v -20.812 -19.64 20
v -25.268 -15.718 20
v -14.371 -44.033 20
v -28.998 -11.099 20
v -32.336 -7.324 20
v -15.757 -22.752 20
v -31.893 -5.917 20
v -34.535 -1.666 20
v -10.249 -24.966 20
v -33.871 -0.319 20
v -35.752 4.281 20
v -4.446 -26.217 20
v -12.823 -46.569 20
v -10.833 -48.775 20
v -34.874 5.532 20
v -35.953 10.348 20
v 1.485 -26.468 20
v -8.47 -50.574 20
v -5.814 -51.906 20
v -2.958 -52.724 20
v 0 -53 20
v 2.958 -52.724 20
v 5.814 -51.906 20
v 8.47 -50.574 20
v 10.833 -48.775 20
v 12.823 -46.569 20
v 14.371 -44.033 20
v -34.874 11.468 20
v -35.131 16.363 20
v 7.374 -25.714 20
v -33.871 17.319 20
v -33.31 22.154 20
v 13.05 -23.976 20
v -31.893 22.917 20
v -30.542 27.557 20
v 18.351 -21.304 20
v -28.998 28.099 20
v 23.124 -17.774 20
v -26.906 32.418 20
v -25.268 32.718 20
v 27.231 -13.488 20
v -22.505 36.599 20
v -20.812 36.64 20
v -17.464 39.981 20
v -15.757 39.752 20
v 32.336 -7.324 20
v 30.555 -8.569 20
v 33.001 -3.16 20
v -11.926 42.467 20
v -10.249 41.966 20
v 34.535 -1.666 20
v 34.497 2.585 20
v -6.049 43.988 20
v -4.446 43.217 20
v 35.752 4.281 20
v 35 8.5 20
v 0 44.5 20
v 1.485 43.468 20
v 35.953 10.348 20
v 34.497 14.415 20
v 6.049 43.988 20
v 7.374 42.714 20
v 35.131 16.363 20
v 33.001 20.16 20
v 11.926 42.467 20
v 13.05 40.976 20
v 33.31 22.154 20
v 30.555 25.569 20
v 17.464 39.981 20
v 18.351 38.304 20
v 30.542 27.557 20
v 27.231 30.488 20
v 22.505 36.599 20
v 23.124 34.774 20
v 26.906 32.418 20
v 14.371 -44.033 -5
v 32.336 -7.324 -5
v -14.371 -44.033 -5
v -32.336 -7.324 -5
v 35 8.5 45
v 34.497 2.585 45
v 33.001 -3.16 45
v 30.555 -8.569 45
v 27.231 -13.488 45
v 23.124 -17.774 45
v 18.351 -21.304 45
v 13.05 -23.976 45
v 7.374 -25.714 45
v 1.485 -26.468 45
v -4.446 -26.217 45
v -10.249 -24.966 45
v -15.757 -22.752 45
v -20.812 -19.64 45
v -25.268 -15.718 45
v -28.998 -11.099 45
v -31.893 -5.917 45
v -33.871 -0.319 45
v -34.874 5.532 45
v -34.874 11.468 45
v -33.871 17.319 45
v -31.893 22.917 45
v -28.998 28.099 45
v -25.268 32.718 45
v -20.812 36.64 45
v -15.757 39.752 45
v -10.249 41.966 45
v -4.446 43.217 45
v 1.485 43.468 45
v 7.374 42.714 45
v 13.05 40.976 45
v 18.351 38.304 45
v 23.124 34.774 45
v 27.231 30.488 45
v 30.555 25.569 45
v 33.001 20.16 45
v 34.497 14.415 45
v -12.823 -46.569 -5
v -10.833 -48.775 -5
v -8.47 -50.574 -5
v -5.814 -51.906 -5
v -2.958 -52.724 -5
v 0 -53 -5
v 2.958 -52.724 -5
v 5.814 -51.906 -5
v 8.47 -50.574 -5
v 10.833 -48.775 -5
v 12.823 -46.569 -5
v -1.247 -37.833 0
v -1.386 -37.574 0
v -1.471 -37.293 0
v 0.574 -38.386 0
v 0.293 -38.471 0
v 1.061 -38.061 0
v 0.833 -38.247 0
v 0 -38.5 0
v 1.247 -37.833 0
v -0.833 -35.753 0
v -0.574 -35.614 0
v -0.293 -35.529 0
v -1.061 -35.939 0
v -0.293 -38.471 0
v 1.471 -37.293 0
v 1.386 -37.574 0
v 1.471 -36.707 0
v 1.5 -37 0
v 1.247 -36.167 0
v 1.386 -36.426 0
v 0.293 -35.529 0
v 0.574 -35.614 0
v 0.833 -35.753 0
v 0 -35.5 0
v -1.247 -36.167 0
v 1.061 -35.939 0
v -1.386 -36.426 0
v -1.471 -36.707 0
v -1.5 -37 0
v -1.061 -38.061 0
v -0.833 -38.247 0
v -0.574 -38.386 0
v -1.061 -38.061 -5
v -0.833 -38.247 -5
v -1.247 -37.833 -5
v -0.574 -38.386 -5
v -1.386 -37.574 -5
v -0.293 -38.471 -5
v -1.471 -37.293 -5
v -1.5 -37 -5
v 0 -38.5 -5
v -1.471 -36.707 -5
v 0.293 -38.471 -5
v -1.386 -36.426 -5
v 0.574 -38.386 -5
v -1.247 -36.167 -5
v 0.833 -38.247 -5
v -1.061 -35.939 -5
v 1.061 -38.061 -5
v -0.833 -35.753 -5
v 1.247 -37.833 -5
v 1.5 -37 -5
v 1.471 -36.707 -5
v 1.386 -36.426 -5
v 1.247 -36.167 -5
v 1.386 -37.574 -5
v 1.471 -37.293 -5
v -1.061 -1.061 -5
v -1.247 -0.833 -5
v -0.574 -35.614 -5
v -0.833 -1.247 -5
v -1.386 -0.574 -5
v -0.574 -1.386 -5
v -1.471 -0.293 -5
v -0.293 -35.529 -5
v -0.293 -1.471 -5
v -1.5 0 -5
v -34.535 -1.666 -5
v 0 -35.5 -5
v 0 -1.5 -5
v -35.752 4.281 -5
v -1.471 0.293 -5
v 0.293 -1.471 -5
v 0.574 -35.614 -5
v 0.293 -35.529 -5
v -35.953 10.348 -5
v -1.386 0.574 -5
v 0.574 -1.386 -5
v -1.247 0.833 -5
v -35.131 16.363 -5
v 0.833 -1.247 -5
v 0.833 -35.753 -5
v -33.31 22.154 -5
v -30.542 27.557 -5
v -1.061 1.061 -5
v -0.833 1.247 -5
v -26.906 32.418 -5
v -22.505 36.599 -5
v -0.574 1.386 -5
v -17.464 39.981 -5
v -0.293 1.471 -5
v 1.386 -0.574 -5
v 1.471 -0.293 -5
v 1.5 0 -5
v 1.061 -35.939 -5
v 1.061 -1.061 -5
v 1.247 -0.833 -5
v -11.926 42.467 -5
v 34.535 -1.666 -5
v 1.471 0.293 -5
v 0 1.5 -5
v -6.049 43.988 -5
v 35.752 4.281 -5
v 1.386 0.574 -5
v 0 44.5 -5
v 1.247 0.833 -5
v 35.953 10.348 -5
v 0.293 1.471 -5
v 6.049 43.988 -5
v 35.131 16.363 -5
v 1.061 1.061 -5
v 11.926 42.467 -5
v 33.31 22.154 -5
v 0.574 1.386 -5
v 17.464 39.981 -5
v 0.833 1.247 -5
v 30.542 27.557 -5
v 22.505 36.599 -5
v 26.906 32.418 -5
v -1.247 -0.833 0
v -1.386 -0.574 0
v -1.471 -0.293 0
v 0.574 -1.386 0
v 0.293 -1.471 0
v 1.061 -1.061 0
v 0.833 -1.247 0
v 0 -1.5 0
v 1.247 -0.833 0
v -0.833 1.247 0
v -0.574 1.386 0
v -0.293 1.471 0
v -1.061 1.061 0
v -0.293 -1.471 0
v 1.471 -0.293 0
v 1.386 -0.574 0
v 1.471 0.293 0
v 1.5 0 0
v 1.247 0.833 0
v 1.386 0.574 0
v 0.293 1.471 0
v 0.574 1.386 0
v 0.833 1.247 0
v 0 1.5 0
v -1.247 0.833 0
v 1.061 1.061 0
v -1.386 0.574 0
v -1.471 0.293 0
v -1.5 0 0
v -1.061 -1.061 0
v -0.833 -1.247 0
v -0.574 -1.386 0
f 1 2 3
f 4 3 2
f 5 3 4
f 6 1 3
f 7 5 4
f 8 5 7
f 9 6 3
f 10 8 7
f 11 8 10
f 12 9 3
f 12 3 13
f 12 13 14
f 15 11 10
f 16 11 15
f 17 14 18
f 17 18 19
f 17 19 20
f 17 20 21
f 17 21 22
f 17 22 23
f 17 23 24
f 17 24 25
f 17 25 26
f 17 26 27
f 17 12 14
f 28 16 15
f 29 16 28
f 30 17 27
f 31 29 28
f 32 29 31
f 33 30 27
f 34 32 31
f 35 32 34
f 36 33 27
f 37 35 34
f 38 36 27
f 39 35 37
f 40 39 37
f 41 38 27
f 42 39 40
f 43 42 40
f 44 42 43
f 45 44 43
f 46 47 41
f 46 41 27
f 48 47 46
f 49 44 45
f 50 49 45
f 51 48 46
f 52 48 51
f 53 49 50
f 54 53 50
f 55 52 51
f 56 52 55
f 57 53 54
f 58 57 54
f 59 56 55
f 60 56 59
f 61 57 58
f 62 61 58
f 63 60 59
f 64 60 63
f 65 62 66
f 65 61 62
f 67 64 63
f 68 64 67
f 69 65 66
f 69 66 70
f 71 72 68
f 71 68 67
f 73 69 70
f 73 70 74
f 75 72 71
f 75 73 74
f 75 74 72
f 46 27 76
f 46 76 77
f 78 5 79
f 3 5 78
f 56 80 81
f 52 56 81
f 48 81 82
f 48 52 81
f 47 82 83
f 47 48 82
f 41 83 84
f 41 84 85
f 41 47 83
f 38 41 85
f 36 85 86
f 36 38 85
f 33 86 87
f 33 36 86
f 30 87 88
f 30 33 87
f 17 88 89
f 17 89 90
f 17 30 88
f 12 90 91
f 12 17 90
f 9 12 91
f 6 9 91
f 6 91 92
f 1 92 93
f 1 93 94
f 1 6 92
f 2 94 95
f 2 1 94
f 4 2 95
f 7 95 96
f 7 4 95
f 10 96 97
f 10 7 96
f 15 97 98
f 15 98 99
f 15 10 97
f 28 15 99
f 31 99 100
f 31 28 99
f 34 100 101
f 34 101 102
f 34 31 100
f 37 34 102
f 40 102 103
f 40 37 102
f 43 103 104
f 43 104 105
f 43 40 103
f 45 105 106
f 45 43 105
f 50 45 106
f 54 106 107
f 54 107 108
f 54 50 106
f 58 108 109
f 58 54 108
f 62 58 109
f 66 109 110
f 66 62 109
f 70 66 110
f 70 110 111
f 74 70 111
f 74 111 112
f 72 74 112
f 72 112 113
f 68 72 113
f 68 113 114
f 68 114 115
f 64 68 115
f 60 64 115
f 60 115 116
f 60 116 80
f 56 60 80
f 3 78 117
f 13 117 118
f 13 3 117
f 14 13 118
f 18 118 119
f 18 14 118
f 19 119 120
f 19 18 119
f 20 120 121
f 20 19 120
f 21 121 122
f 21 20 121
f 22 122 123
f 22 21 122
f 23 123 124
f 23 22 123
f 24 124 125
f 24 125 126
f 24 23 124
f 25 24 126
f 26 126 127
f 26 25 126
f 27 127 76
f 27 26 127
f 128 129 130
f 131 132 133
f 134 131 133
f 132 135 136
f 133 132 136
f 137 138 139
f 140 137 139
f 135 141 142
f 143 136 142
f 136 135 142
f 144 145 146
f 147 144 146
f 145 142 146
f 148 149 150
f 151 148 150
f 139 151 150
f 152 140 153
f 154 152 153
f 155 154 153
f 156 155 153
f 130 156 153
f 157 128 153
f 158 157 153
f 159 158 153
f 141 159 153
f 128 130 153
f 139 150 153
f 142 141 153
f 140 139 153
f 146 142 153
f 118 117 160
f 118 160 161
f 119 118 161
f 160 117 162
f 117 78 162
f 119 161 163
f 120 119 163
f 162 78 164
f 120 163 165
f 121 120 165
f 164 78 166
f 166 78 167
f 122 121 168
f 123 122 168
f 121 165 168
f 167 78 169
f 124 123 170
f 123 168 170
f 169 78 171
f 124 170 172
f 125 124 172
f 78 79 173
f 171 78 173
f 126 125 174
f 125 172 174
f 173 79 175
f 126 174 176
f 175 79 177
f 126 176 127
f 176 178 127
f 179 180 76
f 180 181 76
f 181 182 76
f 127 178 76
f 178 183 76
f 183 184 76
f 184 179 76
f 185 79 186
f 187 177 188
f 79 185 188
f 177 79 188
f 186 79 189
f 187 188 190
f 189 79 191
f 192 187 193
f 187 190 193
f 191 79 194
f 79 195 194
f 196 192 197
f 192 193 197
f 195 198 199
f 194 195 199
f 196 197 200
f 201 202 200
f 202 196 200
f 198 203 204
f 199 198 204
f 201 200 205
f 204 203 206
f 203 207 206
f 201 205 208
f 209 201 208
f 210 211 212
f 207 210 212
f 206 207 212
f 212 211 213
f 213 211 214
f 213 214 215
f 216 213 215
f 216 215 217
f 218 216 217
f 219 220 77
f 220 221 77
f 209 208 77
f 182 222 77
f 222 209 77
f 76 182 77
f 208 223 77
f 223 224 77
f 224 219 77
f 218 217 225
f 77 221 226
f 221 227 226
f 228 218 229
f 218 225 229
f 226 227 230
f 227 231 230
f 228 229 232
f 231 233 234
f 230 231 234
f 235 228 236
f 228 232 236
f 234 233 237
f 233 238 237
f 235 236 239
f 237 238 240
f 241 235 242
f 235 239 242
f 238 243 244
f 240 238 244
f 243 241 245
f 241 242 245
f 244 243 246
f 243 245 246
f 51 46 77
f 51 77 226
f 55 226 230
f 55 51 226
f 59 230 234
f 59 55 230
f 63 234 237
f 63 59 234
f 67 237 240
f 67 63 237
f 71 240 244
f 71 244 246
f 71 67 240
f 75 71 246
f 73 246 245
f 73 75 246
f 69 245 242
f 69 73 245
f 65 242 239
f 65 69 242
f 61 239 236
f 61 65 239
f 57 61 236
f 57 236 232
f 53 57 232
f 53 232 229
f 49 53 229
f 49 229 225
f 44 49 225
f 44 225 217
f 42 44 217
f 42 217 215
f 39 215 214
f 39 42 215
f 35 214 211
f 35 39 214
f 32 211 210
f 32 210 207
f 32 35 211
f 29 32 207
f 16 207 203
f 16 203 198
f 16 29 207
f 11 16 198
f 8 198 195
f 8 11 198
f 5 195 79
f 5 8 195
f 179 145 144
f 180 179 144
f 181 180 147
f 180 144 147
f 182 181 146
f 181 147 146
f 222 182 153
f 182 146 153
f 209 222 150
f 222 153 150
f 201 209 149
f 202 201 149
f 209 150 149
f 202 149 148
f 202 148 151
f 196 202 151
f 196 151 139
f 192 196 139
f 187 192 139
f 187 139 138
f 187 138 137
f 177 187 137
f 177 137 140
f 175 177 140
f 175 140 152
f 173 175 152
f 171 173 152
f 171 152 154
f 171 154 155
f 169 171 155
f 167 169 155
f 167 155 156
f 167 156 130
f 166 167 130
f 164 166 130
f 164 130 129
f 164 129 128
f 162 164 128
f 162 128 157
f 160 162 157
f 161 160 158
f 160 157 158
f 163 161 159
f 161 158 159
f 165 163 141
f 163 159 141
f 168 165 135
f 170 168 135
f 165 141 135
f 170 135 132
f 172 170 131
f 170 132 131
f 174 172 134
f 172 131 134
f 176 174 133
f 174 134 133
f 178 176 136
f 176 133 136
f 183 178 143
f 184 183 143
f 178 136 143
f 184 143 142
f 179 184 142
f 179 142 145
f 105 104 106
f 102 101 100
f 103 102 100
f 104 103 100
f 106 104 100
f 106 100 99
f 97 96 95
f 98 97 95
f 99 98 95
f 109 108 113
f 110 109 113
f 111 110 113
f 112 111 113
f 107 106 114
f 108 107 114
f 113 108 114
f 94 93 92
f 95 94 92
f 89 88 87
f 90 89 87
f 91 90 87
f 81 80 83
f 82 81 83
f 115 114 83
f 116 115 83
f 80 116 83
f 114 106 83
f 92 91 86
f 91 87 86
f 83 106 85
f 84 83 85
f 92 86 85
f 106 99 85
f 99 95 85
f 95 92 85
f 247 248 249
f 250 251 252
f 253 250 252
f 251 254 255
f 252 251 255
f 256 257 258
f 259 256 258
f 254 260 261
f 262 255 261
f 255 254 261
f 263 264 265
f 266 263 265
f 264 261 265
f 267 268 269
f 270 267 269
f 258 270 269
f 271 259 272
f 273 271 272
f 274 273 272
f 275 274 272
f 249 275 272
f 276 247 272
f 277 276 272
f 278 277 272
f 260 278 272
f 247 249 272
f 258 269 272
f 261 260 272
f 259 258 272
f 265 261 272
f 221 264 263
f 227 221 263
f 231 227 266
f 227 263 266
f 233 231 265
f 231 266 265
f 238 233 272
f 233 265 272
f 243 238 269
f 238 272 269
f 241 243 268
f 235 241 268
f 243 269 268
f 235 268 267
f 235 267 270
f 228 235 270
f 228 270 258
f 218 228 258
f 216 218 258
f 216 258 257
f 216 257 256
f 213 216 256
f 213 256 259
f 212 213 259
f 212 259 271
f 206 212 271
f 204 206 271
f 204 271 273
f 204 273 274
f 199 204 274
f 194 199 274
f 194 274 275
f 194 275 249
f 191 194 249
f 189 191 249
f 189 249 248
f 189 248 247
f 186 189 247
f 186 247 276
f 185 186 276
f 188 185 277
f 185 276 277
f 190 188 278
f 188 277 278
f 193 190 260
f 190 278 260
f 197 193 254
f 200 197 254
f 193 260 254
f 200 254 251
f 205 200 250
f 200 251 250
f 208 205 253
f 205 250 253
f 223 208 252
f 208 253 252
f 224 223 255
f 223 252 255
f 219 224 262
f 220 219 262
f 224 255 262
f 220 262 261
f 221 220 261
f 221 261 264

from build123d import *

# Parameters (mm, degrees)
EXTRUDE_1_DEPTH           = 25
SKETCH_2_R                = 35
EXTRUDE_2_DEPTH           = 25
HOLE_WIZARD_3_0_3_1_D     = 3
HOLE_WIZARD_3_0_3_1_DEPTH = 5


with BuildPart() as part:
    # 草图1 → 凸台-拉伸1 (new body)
    with BuildSketch(Plane.XY.offset(20)):
        with BuildLine():
            Line((14.371408237, -44.032967033), (32.335668533, -7.324175824))
            ThreePointArc((32.335668533, -7.324175824), (0, 44.5), (-32.335668533, -7.324175824))
            Line((-32.335668533, -7.324175824), (-14.371408237, -44.032967033))
            ThreePointArc((-14.371408237, -44.032967033), (0, -53), (14.371408237, -44.032967033))
        make_face()
    extrude(amount=-EXTRUDE_1_DEPTH)

    # 草图2 → 凸台-拉伸2 (add)
    with BuildSketch(Plane(origin=(0, 0, 20), x_dir=(-1, 0, 0), z_dir=(0, 0, -1))):
        with Locations(Location((0, 8.5, 0), (0, 0, 180))):
            Circle(SKETCH_2_R)
    extrude(amount=-EXTRUDE_2_DEPTH)

    # Ø3.0 (3) 直径孔1
    with Locations(Plane(origin=(0, 0, -5), x_dir=(-1, 0, 0), z_dir=(0, 0, -1))):
        with Locations((0, 0), (0, -37)):
            Hole(HOLE_WIZARD_3_0_3_1_D / 2, depth=HOLE_WIZARD_3_0_3_1_DEPTH)


solid = part.part
